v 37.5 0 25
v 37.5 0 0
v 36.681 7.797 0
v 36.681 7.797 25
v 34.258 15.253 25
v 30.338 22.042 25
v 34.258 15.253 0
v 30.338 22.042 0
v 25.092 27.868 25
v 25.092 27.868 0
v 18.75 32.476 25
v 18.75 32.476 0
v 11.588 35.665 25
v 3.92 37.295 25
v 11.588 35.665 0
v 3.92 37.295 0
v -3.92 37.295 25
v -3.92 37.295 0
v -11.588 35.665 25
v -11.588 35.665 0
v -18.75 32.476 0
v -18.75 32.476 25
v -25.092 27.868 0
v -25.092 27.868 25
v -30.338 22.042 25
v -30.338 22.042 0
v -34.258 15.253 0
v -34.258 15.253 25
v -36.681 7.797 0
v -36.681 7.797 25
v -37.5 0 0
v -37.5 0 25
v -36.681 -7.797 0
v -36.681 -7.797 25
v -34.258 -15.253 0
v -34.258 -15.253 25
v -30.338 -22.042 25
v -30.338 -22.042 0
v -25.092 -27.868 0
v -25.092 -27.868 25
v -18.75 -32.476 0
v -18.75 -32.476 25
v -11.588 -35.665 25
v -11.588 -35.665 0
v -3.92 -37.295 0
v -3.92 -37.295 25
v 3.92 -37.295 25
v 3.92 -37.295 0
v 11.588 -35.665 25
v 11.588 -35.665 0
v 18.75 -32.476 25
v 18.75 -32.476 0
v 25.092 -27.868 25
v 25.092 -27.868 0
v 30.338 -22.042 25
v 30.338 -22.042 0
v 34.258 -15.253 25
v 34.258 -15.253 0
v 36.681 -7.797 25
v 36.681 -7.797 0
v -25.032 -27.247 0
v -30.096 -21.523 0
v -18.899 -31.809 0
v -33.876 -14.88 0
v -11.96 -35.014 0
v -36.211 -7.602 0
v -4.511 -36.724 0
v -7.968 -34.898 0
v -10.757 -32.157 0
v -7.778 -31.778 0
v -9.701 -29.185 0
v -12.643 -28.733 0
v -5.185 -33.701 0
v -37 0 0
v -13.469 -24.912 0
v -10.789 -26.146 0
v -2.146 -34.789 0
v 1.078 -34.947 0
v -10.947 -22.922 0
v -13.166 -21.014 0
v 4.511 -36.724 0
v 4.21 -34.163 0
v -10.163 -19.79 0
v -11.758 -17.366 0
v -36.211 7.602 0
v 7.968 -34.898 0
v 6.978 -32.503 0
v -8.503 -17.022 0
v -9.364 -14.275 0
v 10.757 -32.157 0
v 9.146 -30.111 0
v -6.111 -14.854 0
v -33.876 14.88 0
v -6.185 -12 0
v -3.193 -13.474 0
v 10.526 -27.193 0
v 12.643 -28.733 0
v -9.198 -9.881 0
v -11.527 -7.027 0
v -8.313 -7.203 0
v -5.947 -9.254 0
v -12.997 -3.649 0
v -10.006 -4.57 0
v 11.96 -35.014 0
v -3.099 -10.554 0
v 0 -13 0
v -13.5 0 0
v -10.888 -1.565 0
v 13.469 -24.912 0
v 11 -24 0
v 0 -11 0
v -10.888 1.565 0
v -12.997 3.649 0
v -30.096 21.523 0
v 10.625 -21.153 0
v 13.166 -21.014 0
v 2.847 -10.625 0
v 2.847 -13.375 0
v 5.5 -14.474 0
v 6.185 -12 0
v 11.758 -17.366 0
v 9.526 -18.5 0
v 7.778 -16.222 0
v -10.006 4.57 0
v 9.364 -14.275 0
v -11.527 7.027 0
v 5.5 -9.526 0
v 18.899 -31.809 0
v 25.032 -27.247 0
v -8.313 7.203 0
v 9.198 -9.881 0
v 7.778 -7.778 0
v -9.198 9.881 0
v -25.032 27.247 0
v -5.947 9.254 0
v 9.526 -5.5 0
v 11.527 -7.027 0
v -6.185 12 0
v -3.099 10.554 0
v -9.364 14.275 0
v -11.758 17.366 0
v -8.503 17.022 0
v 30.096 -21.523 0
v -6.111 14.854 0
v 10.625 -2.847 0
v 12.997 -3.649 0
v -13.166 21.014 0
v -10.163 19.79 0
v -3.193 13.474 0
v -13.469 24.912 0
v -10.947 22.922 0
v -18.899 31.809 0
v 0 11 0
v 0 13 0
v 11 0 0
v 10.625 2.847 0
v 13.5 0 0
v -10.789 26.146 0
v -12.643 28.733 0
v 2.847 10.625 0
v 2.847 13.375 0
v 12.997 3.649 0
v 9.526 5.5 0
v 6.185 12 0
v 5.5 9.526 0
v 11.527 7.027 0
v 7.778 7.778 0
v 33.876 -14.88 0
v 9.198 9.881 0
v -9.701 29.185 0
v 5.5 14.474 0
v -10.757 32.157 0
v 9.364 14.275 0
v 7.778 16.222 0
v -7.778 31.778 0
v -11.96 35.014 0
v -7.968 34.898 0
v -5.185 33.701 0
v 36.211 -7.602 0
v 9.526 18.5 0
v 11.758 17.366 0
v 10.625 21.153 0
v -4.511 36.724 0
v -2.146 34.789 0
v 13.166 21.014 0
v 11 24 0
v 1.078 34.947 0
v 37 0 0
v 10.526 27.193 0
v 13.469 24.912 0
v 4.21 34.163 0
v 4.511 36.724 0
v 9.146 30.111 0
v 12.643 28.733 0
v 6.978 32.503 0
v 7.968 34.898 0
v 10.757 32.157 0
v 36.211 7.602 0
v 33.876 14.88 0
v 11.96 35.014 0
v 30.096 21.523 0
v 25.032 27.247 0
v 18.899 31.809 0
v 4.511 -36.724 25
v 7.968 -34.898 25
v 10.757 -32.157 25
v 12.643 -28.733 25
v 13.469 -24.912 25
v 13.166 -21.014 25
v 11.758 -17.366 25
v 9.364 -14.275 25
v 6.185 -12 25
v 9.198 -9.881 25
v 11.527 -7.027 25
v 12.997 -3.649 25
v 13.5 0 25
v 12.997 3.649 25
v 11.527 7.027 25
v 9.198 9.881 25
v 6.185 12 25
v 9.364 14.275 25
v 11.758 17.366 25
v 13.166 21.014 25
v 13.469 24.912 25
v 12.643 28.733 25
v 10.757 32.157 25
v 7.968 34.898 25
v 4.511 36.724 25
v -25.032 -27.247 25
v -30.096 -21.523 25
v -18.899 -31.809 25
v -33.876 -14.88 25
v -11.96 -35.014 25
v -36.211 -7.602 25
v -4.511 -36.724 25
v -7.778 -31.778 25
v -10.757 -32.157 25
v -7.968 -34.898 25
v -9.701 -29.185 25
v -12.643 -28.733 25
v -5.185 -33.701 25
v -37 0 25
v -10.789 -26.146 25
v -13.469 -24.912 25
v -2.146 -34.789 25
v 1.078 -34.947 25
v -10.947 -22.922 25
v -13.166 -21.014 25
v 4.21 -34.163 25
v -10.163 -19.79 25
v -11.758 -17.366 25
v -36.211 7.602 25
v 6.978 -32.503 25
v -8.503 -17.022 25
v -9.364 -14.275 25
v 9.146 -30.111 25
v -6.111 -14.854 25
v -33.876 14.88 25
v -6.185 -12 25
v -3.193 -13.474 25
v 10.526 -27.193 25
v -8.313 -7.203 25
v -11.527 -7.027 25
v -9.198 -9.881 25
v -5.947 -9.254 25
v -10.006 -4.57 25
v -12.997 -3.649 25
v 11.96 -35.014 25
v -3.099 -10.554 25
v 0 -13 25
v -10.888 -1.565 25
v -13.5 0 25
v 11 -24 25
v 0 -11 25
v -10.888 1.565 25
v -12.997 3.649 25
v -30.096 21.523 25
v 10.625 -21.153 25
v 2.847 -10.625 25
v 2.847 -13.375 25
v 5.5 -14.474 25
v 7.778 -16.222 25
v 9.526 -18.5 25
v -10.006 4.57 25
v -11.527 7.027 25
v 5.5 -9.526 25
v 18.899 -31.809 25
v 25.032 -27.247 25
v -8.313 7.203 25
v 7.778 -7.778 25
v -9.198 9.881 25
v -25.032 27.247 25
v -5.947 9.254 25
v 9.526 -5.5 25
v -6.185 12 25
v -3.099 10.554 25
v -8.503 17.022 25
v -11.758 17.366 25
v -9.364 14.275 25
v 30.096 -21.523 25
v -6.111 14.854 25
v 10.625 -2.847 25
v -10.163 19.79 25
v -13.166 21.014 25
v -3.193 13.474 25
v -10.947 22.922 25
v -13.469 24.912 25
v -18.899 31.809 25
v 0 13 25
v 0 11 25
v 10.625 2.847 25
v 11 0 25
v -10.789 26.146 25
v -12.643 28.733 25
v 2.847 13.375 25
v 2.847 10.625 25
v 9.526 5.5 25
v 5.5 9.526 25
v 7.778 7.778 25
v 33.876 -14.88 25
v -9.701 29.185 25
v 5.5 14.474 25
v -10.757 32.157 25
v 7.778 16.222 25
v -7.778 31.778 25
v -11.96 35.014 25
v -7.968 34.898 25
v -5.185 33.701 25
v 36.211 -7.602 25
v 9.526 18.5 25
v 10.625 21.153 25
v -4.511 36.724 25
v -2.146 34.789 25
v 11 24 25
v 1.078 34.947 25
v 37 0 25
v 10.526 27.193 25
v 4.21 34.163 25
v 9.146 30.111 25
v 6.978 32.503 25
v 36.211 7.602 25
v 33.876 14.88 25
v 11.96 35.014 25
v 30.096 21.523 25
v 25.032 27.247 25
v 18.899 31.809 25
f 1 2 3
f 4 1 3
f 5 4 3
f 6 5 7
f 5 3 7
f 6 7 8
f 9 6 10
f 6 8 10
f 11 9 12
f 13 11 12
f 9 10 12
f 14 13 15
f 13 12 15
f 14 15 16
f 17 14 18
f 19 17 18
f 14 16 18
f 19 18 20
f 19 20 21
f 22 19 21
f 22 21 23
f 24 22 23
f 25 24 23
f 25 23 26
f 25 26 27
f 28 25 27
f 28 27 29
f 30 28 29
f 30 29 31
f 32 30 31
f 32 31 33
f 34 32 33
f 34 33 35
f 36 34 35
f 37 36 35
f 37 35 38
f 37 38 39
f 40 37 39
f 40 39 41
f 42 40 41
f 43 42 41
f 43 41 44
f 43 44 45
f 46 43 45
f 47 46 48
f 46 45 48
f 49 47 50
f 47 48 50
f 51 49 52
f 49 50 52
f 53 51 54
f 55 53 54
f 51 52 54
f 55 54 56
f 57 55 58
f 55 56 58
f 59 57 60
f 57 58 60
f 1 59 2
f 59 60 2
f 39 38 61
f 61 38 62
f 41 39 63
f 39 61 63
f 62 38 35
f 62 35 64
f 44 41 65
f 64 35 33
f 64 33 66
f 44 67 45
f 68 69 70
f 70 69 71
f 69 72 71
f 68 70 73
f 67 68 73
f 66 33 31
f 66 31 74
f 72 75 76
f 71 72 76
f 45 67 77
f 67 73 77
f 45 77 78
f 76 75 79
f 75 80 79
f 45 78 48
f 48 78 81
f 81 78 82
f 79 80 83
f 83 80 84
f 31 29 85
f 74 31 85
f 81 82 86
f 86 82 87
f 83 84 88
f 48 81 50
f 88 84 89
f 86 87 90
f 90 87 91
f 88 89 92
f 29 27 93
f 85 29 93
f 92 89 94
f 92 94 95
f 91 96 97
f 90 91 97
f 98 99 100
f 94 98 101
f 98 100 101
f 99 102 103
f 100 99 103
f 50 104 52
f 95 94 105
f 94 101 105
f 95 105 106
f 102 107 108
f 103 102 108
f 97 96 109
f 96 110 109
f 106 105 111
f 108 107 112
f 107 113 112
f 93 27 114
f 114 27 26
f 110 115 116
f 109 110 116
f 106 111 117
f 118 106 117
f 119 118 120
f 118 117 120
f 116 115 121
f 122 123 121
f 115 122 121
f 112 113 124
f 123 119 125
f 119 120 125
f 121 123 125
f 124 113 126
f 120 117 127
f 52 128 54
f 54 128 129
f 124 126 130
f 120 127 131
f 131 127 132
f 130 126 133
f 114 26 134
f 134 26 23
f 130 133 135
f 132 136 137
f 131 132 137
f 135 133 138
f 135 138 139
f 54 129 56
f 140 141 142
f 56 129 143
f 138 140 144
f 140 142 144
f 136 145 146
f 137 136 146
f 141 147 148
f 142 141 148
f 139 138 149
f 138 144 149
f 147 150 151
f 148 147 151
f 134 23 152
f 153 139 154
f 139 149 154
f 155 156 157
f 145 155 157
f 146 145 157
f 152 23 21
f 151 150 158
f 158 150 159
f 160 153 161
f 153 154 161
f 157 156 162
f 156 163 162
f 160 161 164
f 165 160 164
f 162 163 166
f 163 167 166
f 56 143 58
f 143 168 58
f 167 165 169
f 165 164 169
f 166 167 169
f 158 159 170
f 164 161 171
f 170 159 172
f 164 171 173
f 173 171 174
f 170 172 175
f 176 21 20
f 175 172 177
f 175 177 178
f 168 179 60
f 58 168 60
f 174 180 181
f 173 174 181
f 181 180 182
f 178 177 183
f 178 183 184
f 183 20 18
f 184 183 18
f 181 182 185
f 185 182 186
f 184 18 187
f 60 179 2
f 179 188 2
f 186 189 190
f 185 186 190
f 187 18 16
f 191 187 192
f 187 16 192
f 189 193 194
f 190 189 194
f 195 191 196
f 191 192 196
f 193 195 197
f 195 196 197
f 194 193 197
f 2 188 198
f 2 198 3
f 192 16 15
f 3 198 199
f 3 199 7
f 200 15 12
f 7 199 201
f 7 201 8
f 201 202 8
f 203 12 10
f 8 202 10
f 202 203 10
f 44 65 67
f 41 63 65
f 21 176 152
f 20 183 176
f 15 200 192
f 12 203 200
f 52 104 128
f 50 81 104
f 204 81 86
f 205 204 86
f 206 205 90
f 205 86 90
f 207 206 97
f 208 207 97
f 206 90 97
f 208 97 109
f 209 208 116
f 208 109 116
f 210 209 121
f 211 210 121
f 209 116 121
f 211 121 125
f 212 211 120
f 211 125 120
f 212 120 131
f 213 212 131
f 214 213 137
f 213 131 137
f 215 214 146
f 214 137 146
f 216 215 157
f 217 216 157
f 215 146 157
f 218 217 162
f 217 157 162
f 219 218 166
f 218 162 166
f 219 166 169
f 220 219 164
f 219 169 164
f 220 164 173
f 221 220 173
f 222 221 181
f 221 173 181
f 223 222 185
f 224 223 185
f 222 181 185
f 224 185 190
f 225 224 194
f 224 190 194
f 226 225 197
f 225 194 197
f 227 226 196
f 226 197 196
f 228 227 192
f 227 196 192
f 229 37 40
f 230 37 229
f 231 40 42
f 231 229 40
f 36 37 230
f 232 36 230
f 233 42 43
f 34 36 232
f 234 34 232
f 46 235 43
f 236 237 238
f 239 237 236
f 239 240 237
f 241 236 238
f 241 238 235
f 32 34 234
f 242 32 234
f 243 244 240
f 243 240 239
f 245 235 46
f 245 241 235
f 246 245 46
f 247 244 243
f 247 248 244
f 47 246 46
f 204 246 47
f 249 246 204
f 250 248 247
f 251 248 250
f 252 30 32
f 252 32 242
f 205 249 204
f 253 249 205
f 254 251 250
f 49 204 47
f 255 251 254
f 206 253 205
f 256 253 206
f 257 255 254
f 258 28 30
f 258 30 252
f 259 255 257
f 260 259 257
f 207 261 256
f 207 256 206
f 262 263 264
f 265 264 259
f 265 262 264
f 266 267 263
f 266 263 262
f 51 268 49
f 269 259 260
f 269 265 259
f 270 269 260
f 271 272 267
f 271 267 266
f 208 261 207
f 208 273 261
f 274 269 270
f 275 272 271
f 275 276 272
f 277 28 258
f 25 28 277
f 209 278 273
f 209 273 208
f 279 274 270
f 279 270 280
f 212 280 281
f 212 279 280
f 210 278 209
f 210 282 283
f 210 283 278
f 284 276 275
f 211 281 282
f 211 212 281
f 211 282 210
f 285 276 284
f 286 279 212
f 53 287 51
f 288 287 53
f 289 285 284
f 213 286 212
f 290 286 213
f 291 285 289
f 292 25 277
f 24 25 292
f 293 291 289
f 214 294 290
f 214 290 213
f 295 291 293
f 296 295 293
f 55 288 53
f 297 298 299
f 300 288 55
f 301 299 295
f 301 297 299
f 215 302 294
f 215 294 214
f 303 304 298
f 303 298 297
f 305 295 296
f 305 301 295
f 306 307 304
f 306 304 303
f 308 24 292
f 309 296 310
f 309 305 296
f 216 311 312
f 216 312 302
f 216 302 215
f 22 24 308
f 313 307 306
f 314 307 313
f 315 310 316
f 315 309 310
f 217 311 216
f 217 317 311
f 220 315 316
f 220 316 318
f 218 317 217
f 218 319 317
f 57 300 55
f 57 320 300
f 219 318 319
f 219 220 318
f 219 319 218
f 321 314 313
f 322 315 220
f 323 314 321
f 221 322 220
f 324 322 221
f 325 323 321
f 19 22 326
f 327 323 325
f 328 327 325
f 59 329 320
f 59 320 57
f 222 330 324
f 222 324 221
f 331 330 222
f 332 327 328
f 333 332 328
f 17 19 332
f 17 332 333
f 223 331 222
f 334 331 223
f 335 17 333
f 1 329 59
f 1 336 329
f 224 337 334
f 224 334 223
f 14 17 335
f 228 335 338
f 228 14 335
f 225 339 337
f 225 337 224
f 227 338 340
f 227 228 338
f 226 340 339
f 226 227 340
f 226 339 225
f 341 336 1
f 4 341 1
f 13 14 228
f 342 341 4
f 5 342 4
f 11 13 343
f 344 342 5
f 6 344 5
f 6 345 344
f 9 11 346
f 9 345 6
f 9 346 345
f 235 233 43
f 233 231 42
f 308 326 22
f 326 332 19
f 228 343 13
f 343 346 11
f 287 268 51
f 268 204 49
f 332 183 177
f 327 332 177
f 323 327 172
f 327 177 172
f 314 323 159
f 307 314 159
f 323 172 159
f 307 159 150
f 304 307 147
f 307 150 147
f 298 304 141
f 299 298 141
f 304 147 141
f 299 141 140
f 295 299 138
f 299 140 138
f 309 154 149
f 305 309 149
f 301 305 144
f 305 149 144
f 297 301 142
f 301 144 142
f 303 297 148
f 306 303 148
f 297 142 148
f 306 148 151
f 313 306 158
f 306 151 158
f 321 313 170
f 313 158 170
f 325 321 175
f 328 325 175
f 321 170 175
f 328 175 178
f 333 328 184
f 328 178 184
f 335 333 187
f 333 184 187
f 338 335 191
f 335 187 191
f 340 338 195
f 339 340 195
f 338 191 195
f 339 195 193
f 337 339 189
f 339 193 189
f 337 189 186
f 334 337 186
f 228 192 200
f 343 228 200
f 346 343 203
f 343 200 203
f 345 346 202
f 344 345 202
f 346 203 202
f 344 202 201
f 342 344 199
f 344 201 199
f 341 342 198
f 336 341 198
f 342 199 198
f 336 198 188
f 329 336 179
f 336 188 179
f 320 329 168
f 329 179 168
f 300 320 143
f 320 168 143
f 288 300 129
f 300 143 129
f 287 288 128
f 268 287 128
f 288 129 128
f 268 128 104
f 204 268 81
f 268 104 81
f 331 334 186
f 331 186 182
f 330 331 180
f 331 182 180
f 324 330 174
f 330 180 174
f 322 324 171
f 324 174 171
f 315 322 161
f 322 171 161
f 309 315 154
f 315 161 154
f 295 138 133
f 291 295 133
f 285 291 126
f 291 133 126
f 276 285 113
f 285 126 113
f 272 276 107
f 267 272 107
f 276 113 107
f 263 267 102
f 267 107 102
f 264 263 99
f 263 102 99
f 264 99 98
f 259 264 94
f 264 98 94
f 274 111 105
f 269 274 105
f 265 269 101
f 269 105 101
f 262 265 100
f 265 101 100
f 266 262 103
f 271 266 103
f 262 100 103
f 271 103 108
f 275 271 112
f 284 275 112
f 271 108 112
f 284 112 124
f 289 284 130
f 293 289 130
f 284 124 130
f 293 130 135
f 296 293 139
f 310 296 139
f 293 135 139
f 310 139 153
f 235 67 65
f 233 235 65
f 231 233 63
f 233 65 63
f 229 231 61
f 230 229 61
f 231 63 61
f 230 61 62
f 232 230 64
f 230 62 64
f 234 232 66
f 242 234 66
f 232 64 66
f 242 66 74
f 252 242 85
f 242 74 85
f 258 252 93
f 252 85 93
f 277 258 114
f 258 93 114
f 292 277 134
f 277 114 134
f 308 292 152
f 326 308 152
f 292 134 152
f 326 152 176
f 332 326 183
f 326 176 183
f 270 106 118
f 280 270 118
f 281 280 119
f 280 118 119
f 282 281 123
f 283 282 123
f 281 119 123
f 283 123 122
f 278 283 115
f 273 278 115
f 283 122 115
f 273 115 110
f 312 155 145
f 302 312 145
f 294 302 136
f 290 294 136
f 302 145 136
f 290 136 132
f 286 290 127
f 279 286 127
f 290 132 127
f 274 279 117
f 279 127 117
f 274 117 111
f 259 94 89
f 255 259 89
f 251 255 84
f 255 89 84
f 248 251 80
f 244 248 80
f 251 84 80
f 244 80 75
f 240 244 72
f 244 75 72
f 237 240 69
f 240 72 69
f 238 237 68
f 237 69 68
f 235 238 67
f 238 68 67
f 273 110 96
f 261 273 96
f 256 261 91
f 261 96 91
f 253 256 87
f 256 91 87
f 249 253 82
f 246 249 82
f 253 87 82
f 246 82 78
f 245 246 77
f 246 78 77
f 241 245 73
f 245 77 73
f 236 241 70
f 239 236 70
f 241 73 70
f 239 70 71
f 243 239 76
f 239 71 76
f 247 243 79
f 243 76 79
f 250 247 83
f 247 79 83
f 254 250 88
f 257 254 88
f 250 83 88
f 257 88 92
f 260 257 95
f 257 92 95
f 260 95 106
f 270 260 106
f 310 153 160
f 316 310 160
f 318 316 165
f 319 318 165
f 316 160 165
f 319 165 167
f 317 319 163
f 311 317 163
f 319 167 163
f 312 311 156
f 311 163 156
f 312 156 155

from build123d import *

# Parameters (mm, degrees)
F0_R     = 37.5
F1_DEPTH = 3
F2_DEPTH = 25


with BuildPart() as f1:
    # F0 (on Top) → F1 (new body)
    with BuildSketch(Plane.XY):
        with BuildLine():
            ThreePointArc((11, -24), (7.778175, -16.221825), (0, -13))
            ThreePointArc((0, -13), (-7.778175, -31.778175), (11, -24))
        make_face()
        with BuildLine():
            ThreePointArc((11, 24), (-7.778175, 31.778175), (0, 13))
            ThreePointArc((0, 13), (7.778175, 16.221825), (11, 24))
        make_face()
        Circle(F0_R)
        with BuildLine():
            ThreePointArc((11, -24), (-7.778175, -31.778175), (0, -13))
            ThreePointArc((0, -13), (7.778175, -16.221825), (11, -24))
        make_face(mode=Mode.SUBTRACT)
        with BuildLine():
            ThreePointArc((-4.511195, 36.723958), (-13.469182, 24.911673), (-6.184658, 12))
            ThreePointArc((-6.184658, 12), (-13.5, 0), (-6.184658, -12))
            ThreePointArc((-6.184658, -12), (-13.469182, -24.911673), (-4.511195, -36.723958))
            ThreePointArc((-4.511195, -36.723958), (-37, 0), (-4.511195, 36.723958))
        make_face(mode=Mode.SUBTRACT)
        with BuildLine():
            ThreePointArc((0, 11), (7.778175, 7.778175), (11, 0))
            ThreePointArc((11, 0), (7.778175, -7.778175), (0, -11))
            ThreePointArc((0, -11), (-11, 0), (0, 11))
        make_face(mode=Mode.SUBTRACT)
        with BuildLine():
            ThreePointArc((6.184658, -12), (13.5, 0), (6.184658, 12))
            ThreePointArc((6.184658, 12), (13.469182, 24.911673), (4.511195, 36.723958))
            ThreePointArc((4.511195, 36.723958), (37, 0), (4.511195, -36.723958))
            ThreePointArc((4.511195, -36.723958), (13.469182, -24.911673), (6.184658, -12))
        make_face(mode=Mode.SUBTRACT)
        with BuildLine():
            ThreePointArc((11, 24), (7.778175, 16.221825), (0, 13))
            ThreePointArc((0, 13), (-7.778175, 31.778175), (11, 24))
        make_face(mode=Mode.SUBTRACT)
    extrude(amount=F1_DEPTH)

    # F0 (on Top) → F2 (join)
    with BuildSketch(Plane.XY):
        with BuildLine():
            ThreePointArc((11, -24), (7.778175, -16.221825), (0, -13))
            ThreePointArc((0, -13), (-7.778175, -31.778175), (11, -24))
        make_face()
        with BuildLine():
            ThreePointArc((11, 24), (-7.778175, 31.778175), (0, 13))
            ThreePointArc((0, 13), (7.778175, 16.221825), (11, 24))
        make_face()
        Circle(F0_R)
        with BuildLine():
            ThreePointArc((11, -24), (-7.778175, -31.778175), (0, -13))
            ThreePointArc((0, -13), (7.778175, -16.221825), (11, -24))
        make_face(mode=Mode.SUBTRACT)
        with BuildLine():
            ThreePointArc((-4.511195, 36.723958), (-13.469182, 24.911673), (-6.184658, 12))
            ThreePointArc((-6.184658, 12), (-13.5, 0), (-6.184658, -12))
            ThreePointArc((-6.184658, -12), (-13.469182, -24.911673), (-4.511195, -36.723958))
            ThreePointArc((-4.511195, -36.723958), (-37, 0), (-4.511195, 36.723958))
        make_face(mode=Mode.SUBTRACT)
        with BuildLine():
            ThreePointArc((0, 11), (7.778175, 7.778175), (11, 0))
            ThreePointArc((11, 0), (7.778175, -7.778175), (0, -11))
            ThreePointArc((0, -11), (-11, 0), (0, 11))
        make_face(mode=Mode.SUBTRACT)
        with BuildLine():
            ThreePointArc((6.184658, -12), (13.5, 0), (6.184658, 12))
            ThreePointArc((6.184658, 12), (13.469182, 24.911673), (4.511195, 36.723958))
            ThreePointArc((4.511195, 36.723958), (37, 0), (4.511195, -36.723958))
            ThreePointArc((4.511195, -36.723958), (13.469182, -24.911673), (6.184658, -12))
        make_face(mode=Mode.SUBTRACT)
        with BuildLine():
            ThreePointArc((11, 24), (7.778175, 16.221825), (0, 13))
            ThreePointArc((0, 13), (-7.778175, 31.778175), (11, 24))
        make_face(mode=Mode.SUBTRACT)
    extrude(amount=F2_DEPTH)


solid = f1.part
